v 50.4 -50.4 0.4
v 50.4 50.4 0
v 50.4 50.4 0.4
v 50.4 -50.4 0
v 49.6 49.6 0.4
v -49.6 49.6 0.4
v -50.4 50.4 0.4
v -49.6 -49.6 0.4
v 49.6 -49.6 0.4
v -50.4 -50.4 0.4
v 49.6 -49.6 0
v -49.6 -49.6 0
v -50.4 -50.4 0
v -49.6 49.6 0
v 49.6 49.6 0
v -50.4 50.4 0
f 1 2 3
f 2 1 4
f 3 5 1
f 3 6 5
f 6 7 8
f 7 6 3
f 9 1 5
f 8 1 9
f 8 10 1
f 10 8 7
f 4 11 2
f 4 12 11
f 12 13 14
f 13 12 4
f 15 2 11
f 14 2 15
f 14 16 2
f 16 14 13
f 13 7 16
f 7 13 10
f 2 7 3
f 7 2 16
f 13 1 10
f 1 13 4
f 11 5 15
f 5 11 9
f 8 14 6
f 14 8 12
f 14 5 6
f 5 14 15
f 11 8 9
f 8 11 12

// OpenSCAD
width=100;
border_width=0.4;
border_height=0.4;


module calibration_square()  {
translate([0,0,border_height/2])
difference() {
		cube(size=[width+border_width*2,width+border_width*2,border_height], center=true);	
		cube(size=[width-border_width*2,width-border_width*2,border_height*2], center=true);
}
}

calibration_square();
